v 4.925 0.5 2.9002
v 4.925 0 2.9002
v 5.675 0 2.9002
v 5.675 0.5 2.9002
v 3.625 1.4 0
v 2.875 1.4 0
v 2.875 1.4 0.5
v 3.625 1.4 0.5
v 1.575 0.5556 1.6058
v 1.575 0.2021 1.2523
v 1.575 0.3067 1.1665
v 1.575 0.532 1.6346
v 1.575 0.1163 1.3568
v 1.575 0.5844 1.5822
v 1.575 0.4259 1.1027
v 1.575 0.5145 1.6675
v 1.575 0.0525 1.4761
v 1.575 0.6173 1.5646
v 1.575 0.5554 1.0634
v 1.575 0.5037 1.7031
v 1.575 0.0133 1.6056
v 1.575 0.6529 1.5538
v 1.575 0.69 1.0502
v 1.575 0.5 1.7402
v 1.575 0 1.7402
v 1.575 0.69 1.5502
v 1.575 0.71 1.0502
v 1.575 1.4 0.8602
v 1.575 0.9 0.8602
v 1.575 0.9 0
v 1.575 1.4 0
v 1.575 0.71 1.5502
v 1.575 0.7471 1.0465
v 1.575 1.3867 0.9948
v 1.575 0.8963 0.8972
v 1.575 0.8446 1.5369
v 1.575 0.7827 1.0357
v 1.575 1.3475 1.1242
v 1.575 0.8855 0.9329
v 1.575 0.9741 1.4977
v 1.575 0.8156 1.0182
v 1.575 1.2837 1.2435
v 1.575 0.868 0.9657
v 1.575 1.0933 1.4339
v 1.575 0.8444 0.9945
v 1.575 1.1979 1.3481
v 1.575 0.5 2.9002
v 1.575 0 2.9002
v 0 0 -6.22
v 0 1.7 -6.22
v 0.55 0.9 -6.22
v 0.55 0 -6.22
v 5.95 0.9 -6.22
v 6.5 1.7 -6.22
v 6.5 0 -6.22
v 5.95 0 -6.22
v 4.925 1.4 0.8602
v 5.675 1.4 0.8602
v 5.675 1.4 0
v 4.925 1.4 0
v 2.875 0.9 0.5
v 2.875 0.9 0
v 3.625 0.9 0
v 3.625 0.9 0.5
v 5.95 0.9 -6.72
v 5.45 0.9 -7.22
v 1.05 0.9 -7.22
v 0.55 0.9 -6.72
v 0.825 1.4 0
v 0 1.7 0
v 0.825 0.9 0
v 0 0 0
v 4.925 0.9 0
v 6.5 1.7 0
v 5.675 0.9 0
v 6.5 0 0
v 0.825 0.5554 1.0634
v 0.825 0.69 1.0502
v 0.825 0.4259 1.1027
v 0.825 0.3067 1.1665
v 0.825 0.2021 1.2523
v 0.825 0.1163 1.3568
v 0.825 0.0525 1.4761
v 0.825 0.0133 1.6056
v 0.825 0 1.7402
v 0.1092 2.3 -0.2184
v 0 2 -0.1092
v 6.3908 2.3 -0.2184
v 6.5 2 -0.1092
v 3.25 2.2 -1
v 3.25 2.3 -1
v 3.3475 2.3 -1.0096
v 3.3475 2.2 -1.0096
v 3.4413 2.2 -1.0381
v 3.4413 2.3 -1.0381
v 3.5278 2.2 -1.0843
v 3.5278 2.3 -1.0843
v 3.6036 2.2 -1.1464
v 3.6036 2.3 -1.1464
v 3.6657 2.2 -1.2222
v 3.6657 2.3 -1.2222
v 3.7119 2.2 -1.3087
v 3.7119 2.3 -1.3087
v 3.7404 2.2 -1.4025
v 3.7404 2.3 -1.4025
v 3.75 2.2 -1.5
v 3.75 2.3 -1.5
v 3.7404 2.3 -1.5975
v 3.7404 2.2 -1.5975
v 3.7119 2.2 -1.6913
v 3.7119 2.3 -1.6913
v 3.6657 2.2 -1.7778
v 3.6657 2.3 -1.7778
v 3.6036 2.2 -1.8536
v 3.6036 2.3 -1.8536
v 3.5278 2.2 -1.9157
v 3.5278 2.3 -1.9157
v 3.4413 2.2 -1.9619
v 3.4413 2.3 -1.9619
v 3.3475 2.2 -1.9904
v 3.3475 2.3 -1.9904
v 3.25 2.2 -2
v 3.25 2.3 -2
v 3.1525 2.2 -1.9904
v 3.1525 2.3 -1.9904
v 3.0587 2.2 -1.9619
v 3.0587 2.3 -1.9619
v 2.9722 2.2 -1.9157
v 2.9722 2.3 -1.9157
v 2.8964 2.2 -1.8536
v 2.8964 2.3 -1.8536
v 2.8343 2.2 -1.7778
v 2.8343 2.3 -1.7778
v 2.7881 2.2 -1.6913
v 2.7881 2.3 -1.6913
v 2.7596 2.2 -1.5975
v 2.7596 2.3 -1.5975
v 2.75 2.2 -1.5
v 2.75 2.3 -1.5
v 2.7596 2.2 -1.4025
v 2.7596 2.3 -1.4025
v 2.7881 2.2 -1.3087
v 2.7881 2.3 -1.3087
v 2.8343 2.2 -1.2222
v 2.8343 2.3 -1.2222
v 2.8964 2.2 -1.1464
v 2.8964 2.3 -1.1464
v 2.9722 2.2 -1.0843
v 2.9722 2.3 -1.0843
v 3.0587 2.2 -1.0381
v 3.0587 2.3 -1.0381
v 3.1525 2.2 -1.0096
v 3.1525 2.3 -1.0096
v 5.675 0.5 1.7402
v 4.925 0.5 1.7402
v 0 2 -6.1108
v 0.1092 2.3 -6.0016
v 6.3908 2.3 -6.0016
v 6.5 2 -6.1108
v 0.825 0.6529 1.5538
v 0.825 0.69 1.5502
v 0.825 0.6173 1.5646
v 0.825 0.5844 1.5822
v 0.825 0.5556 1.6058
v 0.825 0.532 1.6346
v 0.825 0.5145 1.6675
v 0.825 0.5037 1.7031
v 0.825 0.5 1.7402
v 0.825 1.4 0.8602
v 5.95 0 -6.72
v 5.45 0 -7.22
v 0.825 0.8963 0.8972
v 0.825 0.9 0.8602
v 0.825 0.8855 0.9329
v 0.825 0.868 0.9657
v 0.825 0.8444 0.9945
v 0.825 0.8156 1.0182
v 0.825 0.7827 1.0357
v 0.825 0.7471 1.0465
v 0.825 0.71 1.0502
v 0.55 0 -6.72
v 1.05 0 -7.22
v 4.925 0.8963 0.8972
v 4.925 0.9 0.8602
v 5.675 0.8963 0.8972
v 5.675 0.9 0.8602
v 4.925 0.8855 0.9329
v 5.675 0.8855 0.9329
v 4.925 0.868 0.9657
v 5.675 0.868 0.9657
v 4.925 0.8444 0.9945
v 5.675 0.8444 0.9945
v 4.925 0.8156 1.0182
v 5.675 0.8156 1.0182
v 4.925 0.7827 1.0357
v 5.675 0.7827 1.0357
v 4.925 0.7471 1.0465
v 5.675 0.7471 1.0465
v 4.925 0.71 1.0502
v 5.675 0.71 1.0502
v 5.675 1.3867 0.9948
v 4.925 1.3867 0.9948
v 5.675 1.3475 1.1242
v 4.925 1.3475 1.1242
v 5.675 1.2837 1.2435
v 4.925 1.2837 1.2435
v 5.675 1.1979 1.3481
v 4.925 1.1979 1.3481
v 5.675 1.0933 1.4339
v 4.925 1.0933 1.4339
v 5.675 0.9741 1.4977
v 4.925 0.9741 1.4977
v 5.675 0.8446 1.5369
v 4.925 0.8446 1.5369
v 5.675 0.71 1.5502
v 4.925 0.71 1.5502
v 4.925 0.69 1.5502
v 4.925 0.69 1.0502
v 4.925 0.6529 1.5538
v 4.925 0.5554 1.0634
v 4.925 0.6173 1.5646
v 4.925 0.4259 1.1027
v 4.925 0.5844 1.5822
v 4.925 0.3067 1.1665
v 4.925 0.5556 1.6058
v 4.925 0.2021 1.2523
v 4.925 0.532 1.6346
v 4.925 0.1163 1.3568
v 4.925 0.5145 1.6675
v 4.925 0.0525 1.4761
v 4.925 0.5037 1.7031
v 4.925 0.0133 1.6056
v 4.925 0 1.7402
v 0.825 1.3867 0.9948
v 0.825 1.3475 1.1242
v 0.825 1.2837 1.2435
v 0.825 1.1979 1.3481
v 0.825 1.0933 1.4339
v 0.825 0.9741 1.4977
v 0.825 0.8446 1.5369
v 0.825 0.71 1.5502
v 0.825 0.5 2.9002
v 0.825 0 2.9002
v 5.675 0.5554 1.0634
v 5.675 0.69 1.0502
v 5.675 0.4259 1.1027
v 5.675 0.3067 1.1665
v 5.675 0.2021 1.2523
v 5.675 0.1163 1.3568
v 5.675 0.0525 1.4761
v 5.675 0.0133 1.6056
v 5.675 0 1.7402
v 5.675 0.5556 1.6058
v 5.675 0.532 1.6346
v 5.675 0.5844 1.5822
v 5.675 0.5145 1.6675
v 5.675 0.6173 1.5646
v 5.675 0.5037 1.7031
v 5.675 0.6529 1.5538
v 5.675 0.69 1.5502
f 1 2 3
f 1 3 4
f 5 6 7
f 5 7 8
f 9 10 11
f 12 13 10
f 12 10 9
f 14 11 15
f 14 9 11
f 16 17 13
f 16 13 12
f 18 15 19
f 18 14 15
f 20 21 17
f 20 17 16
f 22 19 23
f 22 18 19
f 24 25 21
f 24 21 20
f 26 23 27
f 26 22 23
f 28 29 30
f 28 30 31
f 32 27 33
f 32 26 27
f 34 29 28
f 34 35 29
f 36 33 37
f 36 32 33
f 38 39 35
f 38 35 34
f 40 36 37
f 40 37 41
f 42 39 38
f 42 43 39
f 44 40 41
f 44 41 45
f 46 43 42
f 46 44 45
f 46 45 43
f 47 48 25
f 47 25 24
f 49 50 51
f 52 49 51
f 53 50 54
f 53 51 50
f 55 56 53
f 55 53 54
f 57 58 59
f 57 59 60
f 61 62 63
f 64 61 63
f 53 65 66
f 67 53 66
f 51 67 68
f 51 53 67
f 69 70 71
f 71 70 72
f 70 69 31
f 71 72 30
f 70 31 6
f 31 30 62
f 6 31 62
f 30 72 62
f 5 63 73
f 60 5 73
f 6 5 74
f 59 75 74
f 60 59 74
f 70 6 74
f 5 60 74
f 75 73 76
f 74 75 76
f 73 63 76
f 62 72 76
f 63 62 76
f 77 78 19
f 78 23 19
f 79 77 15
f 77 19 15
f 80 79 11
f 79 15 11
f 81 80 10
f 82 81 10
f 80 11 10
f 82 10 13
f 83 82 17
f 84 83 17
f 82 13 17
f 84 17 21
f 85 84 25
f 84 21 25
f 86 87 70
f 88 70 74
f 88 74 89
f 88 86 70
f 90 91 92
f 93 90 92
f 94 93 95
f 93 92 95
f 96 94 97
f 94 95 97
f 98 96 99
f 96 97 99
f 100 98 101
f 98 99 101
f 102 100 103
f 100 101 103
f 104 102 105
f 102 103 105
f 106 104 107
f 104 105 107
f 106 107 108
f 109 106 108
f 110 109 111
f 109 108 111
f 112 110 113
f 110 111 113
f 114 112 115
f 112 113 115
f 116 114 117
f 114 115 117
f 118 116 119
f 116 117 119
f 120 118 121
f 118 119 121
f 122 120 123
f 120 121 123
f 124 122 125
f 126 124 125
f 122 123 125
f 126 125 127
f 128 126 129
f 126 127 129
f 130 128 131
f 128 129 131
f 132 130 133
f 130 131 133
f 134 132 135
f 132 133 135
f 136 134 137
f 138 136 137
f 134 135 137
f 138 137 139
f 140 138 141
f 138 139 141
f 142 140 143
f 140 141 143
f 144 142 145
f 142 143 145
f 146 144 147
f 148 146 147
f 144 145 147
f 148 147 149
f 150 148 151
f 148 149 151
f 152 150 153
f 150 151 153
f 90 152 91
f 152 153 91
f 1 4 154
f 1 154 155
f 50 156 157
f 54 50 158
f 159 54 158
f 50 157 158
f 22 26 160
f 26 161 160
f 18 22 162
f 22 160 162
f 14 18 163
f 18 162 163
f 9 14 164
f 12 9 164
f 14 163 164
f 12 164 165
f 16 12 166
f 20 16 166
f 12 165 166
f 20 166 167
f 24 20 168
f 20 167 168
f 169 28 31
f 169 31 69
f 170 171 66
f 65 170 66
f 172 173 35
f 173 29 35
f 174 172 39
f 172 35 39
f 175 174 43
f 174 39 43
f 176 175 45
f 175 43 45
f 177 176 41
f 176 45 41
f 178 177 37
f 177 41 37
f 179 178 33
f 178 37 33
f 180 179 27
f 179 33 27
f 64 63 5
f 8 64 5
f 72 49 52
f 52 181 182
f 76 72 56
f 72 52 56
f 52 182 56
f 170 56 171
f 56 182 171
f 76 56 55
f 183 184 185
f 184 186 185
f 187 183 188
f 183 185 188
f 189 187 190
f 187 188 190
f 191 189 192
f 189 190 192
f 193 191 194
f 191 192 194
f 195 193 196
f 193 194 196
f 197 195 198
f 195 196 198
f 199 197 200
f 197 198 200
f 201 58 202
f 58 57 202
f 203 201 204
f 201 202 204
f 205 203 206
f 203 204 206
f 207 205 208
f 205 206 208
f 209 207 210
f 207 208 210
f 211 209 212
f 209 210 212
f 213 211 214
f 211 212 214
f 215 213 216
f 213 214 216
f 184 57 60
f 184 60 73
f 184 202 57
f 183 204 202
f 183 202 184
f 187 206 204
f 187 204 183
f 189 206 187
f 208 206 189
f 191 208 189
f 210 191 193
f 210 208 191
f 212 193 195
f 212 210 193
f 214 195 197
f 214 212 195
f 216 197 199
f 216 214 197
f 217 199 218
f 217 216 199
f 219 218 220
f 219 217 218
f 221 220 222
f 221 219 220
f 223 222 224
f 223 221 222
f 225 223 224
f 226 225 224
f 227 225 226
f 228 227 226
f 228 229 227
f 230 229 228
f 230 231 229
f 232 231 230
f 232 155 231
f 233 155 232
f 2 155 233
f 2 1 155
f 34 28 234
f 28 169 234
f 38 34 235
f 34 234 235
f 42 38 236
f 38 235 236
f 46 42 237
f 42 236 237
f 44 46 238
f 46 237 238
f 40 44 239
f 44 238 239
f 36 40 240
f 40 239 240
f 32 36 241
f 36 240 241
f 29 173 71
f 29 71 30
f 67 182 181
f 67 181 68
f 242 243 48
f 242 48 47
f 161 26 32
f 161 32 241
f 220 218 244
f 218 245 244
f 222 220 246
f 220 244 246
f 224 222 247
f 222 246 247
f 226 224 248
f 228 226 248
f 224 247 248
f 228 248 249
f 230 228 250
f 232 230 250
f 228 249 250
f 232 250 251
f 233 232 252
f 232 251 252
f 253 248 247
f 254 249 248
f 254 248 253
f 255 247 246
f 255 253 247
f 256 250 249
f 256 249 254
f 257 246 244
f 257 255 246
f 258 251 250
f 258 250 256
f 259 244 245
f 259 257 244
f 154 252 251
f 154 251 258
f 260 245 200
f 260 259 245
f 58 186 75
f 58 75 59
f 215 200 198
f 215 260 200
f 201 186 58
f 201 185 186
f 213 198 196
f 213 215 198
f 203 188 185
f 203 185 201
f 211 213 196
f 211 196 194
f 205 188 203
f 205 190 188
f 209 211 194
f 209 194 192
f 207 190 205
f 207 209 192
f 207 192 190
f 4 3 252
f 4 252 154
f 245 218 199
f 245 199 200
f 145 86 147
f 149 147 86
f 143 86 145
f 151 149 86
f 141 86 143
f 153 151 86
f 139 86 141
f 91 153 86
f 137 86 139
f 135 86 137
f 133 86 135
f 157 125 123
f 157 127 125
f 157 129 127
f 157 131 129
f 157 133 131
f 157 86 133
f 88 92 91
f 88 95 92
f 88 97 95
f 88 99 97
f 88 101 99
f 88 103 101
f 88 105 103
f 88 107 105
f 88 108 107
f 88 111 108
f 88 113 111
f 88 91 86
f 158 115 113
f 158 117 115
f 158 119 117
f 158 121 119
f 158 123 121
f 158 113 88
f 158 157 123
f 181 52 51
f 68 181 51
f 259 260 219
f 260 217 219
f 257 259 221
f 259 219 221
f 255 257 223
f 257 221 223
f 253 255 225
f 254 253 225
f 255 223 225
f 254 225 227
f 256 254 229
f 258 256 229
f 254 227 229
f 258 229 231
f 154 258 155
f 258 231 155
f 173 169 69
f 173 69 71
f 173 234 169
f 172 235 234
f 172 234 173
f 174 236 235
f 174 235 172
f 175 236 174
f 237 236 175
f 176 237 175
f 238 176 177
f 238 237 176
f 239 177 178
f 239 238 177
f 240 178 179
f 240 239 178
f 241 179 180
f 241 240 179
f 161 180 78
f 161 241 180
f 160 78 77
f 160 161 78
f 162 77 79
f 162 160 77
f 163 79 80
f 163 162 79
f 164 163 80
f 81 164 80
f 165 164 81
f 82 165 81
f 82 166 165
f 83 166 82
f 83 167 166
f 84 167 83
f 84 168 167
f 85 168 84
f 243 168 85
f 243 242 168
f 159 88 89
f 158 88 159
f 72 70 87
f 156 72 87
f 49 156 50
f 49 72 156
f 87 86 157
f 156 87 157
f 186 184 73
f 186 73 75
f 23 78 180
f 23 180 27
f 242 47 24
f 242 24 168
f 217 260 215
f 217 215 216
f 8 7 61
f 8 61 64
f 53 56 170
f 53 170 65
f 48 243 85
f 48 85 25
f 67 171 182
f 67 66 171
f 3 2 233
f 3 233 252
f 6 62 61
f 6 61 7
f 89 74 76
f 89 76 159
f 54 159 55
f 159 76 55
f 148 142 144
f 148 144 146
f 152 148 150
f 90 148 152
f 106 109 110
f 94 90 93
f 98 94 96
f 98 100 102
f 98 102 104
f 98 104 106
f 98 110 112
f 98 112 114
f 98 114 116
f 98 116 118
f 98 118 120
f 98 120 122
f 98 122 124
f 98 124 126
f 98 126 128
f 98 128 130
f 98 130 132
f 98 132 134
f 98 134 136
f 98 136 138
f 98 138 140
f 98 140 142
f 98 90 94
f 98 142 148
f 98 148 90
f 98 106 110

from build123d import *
from OCP.BRepFilletAPI import BRepFilletAPI_MakeChamfer

# Parameters (mm, degrees)
SKETCH1_W           = 6.5
SKETCH1_H           = 6.22
BOSS_EXTRUDE1_DEPTH = 2.3
SKETCH2_R           = 0.5
CUT_EXTRUDE1_DEPTH  = 0.1
SKETCH3_W           = 5.4
SKETCH3_H           = 0.9
BOSS_EXTRUDE2_DEPTH = 1
CHAMFER2_SIZE       = 0.5
SKETCH5_W           = 0.75
SKETCH5_H           = 0.5
SKETCH10_W          = 0.75
SKETCH10_H          = 0.5
BOSS_EXTRUDE3_DEPTH = 0.5
CHAMFER3_SIZE       = 0.6
CHAMFER3_SIZE2      = 0.218382141
CHAMFER4_SIZE       = 0.3
CHAMFER4_SIZE2      = 0.10919107


with BuildPart() as part:
    # Sketch1 → Boss-Extrude1 (new body)
    with BuildSketch(Plane(origin=(0, 0, 0), x_dir=(1, 0, 0), z_dir=(0, 1, 0))):
        with Locations((3.25, 3.11)):
            Rectangle(SKETCH1_W, SKETCH1_H)
    extrude(amount=BOSS_EXTRUDE1_DEPTH)

    # Sketch2 → Cut-Extrude1 (cut)
    with BuildSketch(Plane(origin=(0, 2.3, 0), x_dir=(1, 0, 0), z_dir=(0, 1, 0))):
        with Locations(Location((3.25, 1.5, 0), (0, 0, 270))):
            Circle(SKETCH2_R)
    extrude(amount=-CUT_EXTRUDE1_DEPTH, mode=Mode.SUBTRACT)

    # Sketch3 → Boss-Extrude2 (add)
    with BuildSketch(Plane(origin=(0, 0, -6.22), x_dir=(-1, 0, 0), z_dir=(0, 0, -1))):
        with Locations((-3.25, 0.45)):
            Rectangle(SKETCH3_W, SKETCH3_H)
    extrude(amount=BOSS_EXTRUDE2_DEPTH)

    # Chamfer2
    chamfer2_edges = [part.edges().sort_by_distance(p)[0] for p in [
        (5.95, 0.45, -7.22),
        (0.55, 0.45, -7.22),
    ]]
    chamfer(chamfer2_edges, length=CHAMFER2_SIZE)

    # Sweep2: sweep along a path in Sketch8
    with BuildLine(Plane(origin=(1.2, 0, 0), x_dir=(0, 0, -1), z_dir=(1, 0, 0))) as sweep2_path:
        Line((0, 1.15), (-0.860174932, 1.15))
        ThreePointArc((-0.860174932, 1.15), (-1.171301915, 1.021126984), (-1.300174932, 0.71))
        Line((-1.300174932, 0.71), (-1.300174932, 0.69))
        ThreePointArc((-1.300174932, 0.69), (-1.429047948, 0.378873016), (-1.740174932, 0.25))
        Line((-1.740174932, 0.25), (-2.900174932, 0.25))
    # Sketch5 → Sweep2 (sweep)
    with BuildSketch(Plane.XY):
        with Locations((1.2, 1.15)):
            Rectangle(SKETCH5_W, SKETCH5_H)
        with Locations((5.3, 1.15)):
            Rectangle(SKETCH5_W, SKETCH5_H)
    sweep(path=sweep2_path.line)

    # Sketch10 → Boss-Extrude3 (add)
    with BuildSketch(Plane.XY):
        with Locations((3.25, 1.15)):
            Rectangle(SKETCH10_W, SKETCH10_H)
    extrude(amount=BOSS_EXTRUDE3_DEPTH)

    # Chamfer3: one chamfer whose edges measure the first distance from different faces: ONE call of the kernel's chamfer builder (chamfer() names one face for all edges)
    chamfer3_edges_1 = [part.edges().sort_by_distance(p)[0] for p in [
        (3.25, 2.3, -6.22),
    ]]
    chamfer3_side_1 = [part.faces().sort_by_distance(p)[0] for p in [
        (3.25, 1.48716551, -6.22),
    ]]
    chamfer3_edges_2 = [part.edges().sort_by_distance(p)[0] for p in [
        (3.25, 2.3, 0),
    ]]
    chamfer3_side_2 = [part.faces().sort_by_distance(p)[0] for p in [
        (0.068949257, 1.15, 0),
    ]]
    chamfer3 = BRepFilletAPI_MakeChamfer(part.part.solid().wrapped)
    for e in chamfer3_edges_1:
        chamfer3.Add(CHAMFER3_SIZE, CHAMFER3_SIZE2, e.wrapped, chamfer3_side_1[0].wrapped)  # the first distance lies on this face
    for e in chamfer3_edges_2:
        chamfer3.Add(CHAMFER3_SIZE, CHAMFER3_SIZE2, e.wrapped, chamfer3_side_2[0].wrapped)  # the first distance lies on this face
    add(Compound.cast(chamfer3.Shape()), mode=Mode.REPLACE)

    # Chamfer4: one chamfer whose edges measure the first distance from different faces: ONE call of the kernel's chamfer builder (chamfer() names one face for all edges)
    chamfer4_edges_1 = [part.edges().sort_by_distance(p)[0] for p in [
        (0, 2.3, -3.11),
    ]]
    chamfer4_side_1 = [part.faces().sort_by_distance(p)[0] for p in [
        (0, 1.141218478, -3.11),
    ]]
    chamfer4_edges_2 = [part.edges().sort_by_distance(p)[0] for p in [
        (6.5, 2.3, -3.11),
    ]]
    chamfer4_side_2 = [part.faces().sort_by_distance(p)[0] for p in [
        (6.5, 1.141218478, -3.11),
    ]]
    chamfer4 = BRepFilletAPI_MakeChamfer(part.part.solid().wrapped)
    for e in chamfer4_edges_1:
        chamfer4.Add(CHAMFER4_SIZE, CHAMFER4_SIZE2, e.wrapped, chamfer4_side_1[0].wrapped)  # the first distance lies on this face
    for e in chamfer4_edges_2:
        chamfer4.Add(CHAMFER4_SIZE, CHAMFER4_SIZE2, e.wrapped, chamfer4_side_2[0].wrapped)  # the first distance lies on this face
    add(Compound.cast(chamfer4.Shape()), mode=Mode.REPLACE)


solid = part.part
